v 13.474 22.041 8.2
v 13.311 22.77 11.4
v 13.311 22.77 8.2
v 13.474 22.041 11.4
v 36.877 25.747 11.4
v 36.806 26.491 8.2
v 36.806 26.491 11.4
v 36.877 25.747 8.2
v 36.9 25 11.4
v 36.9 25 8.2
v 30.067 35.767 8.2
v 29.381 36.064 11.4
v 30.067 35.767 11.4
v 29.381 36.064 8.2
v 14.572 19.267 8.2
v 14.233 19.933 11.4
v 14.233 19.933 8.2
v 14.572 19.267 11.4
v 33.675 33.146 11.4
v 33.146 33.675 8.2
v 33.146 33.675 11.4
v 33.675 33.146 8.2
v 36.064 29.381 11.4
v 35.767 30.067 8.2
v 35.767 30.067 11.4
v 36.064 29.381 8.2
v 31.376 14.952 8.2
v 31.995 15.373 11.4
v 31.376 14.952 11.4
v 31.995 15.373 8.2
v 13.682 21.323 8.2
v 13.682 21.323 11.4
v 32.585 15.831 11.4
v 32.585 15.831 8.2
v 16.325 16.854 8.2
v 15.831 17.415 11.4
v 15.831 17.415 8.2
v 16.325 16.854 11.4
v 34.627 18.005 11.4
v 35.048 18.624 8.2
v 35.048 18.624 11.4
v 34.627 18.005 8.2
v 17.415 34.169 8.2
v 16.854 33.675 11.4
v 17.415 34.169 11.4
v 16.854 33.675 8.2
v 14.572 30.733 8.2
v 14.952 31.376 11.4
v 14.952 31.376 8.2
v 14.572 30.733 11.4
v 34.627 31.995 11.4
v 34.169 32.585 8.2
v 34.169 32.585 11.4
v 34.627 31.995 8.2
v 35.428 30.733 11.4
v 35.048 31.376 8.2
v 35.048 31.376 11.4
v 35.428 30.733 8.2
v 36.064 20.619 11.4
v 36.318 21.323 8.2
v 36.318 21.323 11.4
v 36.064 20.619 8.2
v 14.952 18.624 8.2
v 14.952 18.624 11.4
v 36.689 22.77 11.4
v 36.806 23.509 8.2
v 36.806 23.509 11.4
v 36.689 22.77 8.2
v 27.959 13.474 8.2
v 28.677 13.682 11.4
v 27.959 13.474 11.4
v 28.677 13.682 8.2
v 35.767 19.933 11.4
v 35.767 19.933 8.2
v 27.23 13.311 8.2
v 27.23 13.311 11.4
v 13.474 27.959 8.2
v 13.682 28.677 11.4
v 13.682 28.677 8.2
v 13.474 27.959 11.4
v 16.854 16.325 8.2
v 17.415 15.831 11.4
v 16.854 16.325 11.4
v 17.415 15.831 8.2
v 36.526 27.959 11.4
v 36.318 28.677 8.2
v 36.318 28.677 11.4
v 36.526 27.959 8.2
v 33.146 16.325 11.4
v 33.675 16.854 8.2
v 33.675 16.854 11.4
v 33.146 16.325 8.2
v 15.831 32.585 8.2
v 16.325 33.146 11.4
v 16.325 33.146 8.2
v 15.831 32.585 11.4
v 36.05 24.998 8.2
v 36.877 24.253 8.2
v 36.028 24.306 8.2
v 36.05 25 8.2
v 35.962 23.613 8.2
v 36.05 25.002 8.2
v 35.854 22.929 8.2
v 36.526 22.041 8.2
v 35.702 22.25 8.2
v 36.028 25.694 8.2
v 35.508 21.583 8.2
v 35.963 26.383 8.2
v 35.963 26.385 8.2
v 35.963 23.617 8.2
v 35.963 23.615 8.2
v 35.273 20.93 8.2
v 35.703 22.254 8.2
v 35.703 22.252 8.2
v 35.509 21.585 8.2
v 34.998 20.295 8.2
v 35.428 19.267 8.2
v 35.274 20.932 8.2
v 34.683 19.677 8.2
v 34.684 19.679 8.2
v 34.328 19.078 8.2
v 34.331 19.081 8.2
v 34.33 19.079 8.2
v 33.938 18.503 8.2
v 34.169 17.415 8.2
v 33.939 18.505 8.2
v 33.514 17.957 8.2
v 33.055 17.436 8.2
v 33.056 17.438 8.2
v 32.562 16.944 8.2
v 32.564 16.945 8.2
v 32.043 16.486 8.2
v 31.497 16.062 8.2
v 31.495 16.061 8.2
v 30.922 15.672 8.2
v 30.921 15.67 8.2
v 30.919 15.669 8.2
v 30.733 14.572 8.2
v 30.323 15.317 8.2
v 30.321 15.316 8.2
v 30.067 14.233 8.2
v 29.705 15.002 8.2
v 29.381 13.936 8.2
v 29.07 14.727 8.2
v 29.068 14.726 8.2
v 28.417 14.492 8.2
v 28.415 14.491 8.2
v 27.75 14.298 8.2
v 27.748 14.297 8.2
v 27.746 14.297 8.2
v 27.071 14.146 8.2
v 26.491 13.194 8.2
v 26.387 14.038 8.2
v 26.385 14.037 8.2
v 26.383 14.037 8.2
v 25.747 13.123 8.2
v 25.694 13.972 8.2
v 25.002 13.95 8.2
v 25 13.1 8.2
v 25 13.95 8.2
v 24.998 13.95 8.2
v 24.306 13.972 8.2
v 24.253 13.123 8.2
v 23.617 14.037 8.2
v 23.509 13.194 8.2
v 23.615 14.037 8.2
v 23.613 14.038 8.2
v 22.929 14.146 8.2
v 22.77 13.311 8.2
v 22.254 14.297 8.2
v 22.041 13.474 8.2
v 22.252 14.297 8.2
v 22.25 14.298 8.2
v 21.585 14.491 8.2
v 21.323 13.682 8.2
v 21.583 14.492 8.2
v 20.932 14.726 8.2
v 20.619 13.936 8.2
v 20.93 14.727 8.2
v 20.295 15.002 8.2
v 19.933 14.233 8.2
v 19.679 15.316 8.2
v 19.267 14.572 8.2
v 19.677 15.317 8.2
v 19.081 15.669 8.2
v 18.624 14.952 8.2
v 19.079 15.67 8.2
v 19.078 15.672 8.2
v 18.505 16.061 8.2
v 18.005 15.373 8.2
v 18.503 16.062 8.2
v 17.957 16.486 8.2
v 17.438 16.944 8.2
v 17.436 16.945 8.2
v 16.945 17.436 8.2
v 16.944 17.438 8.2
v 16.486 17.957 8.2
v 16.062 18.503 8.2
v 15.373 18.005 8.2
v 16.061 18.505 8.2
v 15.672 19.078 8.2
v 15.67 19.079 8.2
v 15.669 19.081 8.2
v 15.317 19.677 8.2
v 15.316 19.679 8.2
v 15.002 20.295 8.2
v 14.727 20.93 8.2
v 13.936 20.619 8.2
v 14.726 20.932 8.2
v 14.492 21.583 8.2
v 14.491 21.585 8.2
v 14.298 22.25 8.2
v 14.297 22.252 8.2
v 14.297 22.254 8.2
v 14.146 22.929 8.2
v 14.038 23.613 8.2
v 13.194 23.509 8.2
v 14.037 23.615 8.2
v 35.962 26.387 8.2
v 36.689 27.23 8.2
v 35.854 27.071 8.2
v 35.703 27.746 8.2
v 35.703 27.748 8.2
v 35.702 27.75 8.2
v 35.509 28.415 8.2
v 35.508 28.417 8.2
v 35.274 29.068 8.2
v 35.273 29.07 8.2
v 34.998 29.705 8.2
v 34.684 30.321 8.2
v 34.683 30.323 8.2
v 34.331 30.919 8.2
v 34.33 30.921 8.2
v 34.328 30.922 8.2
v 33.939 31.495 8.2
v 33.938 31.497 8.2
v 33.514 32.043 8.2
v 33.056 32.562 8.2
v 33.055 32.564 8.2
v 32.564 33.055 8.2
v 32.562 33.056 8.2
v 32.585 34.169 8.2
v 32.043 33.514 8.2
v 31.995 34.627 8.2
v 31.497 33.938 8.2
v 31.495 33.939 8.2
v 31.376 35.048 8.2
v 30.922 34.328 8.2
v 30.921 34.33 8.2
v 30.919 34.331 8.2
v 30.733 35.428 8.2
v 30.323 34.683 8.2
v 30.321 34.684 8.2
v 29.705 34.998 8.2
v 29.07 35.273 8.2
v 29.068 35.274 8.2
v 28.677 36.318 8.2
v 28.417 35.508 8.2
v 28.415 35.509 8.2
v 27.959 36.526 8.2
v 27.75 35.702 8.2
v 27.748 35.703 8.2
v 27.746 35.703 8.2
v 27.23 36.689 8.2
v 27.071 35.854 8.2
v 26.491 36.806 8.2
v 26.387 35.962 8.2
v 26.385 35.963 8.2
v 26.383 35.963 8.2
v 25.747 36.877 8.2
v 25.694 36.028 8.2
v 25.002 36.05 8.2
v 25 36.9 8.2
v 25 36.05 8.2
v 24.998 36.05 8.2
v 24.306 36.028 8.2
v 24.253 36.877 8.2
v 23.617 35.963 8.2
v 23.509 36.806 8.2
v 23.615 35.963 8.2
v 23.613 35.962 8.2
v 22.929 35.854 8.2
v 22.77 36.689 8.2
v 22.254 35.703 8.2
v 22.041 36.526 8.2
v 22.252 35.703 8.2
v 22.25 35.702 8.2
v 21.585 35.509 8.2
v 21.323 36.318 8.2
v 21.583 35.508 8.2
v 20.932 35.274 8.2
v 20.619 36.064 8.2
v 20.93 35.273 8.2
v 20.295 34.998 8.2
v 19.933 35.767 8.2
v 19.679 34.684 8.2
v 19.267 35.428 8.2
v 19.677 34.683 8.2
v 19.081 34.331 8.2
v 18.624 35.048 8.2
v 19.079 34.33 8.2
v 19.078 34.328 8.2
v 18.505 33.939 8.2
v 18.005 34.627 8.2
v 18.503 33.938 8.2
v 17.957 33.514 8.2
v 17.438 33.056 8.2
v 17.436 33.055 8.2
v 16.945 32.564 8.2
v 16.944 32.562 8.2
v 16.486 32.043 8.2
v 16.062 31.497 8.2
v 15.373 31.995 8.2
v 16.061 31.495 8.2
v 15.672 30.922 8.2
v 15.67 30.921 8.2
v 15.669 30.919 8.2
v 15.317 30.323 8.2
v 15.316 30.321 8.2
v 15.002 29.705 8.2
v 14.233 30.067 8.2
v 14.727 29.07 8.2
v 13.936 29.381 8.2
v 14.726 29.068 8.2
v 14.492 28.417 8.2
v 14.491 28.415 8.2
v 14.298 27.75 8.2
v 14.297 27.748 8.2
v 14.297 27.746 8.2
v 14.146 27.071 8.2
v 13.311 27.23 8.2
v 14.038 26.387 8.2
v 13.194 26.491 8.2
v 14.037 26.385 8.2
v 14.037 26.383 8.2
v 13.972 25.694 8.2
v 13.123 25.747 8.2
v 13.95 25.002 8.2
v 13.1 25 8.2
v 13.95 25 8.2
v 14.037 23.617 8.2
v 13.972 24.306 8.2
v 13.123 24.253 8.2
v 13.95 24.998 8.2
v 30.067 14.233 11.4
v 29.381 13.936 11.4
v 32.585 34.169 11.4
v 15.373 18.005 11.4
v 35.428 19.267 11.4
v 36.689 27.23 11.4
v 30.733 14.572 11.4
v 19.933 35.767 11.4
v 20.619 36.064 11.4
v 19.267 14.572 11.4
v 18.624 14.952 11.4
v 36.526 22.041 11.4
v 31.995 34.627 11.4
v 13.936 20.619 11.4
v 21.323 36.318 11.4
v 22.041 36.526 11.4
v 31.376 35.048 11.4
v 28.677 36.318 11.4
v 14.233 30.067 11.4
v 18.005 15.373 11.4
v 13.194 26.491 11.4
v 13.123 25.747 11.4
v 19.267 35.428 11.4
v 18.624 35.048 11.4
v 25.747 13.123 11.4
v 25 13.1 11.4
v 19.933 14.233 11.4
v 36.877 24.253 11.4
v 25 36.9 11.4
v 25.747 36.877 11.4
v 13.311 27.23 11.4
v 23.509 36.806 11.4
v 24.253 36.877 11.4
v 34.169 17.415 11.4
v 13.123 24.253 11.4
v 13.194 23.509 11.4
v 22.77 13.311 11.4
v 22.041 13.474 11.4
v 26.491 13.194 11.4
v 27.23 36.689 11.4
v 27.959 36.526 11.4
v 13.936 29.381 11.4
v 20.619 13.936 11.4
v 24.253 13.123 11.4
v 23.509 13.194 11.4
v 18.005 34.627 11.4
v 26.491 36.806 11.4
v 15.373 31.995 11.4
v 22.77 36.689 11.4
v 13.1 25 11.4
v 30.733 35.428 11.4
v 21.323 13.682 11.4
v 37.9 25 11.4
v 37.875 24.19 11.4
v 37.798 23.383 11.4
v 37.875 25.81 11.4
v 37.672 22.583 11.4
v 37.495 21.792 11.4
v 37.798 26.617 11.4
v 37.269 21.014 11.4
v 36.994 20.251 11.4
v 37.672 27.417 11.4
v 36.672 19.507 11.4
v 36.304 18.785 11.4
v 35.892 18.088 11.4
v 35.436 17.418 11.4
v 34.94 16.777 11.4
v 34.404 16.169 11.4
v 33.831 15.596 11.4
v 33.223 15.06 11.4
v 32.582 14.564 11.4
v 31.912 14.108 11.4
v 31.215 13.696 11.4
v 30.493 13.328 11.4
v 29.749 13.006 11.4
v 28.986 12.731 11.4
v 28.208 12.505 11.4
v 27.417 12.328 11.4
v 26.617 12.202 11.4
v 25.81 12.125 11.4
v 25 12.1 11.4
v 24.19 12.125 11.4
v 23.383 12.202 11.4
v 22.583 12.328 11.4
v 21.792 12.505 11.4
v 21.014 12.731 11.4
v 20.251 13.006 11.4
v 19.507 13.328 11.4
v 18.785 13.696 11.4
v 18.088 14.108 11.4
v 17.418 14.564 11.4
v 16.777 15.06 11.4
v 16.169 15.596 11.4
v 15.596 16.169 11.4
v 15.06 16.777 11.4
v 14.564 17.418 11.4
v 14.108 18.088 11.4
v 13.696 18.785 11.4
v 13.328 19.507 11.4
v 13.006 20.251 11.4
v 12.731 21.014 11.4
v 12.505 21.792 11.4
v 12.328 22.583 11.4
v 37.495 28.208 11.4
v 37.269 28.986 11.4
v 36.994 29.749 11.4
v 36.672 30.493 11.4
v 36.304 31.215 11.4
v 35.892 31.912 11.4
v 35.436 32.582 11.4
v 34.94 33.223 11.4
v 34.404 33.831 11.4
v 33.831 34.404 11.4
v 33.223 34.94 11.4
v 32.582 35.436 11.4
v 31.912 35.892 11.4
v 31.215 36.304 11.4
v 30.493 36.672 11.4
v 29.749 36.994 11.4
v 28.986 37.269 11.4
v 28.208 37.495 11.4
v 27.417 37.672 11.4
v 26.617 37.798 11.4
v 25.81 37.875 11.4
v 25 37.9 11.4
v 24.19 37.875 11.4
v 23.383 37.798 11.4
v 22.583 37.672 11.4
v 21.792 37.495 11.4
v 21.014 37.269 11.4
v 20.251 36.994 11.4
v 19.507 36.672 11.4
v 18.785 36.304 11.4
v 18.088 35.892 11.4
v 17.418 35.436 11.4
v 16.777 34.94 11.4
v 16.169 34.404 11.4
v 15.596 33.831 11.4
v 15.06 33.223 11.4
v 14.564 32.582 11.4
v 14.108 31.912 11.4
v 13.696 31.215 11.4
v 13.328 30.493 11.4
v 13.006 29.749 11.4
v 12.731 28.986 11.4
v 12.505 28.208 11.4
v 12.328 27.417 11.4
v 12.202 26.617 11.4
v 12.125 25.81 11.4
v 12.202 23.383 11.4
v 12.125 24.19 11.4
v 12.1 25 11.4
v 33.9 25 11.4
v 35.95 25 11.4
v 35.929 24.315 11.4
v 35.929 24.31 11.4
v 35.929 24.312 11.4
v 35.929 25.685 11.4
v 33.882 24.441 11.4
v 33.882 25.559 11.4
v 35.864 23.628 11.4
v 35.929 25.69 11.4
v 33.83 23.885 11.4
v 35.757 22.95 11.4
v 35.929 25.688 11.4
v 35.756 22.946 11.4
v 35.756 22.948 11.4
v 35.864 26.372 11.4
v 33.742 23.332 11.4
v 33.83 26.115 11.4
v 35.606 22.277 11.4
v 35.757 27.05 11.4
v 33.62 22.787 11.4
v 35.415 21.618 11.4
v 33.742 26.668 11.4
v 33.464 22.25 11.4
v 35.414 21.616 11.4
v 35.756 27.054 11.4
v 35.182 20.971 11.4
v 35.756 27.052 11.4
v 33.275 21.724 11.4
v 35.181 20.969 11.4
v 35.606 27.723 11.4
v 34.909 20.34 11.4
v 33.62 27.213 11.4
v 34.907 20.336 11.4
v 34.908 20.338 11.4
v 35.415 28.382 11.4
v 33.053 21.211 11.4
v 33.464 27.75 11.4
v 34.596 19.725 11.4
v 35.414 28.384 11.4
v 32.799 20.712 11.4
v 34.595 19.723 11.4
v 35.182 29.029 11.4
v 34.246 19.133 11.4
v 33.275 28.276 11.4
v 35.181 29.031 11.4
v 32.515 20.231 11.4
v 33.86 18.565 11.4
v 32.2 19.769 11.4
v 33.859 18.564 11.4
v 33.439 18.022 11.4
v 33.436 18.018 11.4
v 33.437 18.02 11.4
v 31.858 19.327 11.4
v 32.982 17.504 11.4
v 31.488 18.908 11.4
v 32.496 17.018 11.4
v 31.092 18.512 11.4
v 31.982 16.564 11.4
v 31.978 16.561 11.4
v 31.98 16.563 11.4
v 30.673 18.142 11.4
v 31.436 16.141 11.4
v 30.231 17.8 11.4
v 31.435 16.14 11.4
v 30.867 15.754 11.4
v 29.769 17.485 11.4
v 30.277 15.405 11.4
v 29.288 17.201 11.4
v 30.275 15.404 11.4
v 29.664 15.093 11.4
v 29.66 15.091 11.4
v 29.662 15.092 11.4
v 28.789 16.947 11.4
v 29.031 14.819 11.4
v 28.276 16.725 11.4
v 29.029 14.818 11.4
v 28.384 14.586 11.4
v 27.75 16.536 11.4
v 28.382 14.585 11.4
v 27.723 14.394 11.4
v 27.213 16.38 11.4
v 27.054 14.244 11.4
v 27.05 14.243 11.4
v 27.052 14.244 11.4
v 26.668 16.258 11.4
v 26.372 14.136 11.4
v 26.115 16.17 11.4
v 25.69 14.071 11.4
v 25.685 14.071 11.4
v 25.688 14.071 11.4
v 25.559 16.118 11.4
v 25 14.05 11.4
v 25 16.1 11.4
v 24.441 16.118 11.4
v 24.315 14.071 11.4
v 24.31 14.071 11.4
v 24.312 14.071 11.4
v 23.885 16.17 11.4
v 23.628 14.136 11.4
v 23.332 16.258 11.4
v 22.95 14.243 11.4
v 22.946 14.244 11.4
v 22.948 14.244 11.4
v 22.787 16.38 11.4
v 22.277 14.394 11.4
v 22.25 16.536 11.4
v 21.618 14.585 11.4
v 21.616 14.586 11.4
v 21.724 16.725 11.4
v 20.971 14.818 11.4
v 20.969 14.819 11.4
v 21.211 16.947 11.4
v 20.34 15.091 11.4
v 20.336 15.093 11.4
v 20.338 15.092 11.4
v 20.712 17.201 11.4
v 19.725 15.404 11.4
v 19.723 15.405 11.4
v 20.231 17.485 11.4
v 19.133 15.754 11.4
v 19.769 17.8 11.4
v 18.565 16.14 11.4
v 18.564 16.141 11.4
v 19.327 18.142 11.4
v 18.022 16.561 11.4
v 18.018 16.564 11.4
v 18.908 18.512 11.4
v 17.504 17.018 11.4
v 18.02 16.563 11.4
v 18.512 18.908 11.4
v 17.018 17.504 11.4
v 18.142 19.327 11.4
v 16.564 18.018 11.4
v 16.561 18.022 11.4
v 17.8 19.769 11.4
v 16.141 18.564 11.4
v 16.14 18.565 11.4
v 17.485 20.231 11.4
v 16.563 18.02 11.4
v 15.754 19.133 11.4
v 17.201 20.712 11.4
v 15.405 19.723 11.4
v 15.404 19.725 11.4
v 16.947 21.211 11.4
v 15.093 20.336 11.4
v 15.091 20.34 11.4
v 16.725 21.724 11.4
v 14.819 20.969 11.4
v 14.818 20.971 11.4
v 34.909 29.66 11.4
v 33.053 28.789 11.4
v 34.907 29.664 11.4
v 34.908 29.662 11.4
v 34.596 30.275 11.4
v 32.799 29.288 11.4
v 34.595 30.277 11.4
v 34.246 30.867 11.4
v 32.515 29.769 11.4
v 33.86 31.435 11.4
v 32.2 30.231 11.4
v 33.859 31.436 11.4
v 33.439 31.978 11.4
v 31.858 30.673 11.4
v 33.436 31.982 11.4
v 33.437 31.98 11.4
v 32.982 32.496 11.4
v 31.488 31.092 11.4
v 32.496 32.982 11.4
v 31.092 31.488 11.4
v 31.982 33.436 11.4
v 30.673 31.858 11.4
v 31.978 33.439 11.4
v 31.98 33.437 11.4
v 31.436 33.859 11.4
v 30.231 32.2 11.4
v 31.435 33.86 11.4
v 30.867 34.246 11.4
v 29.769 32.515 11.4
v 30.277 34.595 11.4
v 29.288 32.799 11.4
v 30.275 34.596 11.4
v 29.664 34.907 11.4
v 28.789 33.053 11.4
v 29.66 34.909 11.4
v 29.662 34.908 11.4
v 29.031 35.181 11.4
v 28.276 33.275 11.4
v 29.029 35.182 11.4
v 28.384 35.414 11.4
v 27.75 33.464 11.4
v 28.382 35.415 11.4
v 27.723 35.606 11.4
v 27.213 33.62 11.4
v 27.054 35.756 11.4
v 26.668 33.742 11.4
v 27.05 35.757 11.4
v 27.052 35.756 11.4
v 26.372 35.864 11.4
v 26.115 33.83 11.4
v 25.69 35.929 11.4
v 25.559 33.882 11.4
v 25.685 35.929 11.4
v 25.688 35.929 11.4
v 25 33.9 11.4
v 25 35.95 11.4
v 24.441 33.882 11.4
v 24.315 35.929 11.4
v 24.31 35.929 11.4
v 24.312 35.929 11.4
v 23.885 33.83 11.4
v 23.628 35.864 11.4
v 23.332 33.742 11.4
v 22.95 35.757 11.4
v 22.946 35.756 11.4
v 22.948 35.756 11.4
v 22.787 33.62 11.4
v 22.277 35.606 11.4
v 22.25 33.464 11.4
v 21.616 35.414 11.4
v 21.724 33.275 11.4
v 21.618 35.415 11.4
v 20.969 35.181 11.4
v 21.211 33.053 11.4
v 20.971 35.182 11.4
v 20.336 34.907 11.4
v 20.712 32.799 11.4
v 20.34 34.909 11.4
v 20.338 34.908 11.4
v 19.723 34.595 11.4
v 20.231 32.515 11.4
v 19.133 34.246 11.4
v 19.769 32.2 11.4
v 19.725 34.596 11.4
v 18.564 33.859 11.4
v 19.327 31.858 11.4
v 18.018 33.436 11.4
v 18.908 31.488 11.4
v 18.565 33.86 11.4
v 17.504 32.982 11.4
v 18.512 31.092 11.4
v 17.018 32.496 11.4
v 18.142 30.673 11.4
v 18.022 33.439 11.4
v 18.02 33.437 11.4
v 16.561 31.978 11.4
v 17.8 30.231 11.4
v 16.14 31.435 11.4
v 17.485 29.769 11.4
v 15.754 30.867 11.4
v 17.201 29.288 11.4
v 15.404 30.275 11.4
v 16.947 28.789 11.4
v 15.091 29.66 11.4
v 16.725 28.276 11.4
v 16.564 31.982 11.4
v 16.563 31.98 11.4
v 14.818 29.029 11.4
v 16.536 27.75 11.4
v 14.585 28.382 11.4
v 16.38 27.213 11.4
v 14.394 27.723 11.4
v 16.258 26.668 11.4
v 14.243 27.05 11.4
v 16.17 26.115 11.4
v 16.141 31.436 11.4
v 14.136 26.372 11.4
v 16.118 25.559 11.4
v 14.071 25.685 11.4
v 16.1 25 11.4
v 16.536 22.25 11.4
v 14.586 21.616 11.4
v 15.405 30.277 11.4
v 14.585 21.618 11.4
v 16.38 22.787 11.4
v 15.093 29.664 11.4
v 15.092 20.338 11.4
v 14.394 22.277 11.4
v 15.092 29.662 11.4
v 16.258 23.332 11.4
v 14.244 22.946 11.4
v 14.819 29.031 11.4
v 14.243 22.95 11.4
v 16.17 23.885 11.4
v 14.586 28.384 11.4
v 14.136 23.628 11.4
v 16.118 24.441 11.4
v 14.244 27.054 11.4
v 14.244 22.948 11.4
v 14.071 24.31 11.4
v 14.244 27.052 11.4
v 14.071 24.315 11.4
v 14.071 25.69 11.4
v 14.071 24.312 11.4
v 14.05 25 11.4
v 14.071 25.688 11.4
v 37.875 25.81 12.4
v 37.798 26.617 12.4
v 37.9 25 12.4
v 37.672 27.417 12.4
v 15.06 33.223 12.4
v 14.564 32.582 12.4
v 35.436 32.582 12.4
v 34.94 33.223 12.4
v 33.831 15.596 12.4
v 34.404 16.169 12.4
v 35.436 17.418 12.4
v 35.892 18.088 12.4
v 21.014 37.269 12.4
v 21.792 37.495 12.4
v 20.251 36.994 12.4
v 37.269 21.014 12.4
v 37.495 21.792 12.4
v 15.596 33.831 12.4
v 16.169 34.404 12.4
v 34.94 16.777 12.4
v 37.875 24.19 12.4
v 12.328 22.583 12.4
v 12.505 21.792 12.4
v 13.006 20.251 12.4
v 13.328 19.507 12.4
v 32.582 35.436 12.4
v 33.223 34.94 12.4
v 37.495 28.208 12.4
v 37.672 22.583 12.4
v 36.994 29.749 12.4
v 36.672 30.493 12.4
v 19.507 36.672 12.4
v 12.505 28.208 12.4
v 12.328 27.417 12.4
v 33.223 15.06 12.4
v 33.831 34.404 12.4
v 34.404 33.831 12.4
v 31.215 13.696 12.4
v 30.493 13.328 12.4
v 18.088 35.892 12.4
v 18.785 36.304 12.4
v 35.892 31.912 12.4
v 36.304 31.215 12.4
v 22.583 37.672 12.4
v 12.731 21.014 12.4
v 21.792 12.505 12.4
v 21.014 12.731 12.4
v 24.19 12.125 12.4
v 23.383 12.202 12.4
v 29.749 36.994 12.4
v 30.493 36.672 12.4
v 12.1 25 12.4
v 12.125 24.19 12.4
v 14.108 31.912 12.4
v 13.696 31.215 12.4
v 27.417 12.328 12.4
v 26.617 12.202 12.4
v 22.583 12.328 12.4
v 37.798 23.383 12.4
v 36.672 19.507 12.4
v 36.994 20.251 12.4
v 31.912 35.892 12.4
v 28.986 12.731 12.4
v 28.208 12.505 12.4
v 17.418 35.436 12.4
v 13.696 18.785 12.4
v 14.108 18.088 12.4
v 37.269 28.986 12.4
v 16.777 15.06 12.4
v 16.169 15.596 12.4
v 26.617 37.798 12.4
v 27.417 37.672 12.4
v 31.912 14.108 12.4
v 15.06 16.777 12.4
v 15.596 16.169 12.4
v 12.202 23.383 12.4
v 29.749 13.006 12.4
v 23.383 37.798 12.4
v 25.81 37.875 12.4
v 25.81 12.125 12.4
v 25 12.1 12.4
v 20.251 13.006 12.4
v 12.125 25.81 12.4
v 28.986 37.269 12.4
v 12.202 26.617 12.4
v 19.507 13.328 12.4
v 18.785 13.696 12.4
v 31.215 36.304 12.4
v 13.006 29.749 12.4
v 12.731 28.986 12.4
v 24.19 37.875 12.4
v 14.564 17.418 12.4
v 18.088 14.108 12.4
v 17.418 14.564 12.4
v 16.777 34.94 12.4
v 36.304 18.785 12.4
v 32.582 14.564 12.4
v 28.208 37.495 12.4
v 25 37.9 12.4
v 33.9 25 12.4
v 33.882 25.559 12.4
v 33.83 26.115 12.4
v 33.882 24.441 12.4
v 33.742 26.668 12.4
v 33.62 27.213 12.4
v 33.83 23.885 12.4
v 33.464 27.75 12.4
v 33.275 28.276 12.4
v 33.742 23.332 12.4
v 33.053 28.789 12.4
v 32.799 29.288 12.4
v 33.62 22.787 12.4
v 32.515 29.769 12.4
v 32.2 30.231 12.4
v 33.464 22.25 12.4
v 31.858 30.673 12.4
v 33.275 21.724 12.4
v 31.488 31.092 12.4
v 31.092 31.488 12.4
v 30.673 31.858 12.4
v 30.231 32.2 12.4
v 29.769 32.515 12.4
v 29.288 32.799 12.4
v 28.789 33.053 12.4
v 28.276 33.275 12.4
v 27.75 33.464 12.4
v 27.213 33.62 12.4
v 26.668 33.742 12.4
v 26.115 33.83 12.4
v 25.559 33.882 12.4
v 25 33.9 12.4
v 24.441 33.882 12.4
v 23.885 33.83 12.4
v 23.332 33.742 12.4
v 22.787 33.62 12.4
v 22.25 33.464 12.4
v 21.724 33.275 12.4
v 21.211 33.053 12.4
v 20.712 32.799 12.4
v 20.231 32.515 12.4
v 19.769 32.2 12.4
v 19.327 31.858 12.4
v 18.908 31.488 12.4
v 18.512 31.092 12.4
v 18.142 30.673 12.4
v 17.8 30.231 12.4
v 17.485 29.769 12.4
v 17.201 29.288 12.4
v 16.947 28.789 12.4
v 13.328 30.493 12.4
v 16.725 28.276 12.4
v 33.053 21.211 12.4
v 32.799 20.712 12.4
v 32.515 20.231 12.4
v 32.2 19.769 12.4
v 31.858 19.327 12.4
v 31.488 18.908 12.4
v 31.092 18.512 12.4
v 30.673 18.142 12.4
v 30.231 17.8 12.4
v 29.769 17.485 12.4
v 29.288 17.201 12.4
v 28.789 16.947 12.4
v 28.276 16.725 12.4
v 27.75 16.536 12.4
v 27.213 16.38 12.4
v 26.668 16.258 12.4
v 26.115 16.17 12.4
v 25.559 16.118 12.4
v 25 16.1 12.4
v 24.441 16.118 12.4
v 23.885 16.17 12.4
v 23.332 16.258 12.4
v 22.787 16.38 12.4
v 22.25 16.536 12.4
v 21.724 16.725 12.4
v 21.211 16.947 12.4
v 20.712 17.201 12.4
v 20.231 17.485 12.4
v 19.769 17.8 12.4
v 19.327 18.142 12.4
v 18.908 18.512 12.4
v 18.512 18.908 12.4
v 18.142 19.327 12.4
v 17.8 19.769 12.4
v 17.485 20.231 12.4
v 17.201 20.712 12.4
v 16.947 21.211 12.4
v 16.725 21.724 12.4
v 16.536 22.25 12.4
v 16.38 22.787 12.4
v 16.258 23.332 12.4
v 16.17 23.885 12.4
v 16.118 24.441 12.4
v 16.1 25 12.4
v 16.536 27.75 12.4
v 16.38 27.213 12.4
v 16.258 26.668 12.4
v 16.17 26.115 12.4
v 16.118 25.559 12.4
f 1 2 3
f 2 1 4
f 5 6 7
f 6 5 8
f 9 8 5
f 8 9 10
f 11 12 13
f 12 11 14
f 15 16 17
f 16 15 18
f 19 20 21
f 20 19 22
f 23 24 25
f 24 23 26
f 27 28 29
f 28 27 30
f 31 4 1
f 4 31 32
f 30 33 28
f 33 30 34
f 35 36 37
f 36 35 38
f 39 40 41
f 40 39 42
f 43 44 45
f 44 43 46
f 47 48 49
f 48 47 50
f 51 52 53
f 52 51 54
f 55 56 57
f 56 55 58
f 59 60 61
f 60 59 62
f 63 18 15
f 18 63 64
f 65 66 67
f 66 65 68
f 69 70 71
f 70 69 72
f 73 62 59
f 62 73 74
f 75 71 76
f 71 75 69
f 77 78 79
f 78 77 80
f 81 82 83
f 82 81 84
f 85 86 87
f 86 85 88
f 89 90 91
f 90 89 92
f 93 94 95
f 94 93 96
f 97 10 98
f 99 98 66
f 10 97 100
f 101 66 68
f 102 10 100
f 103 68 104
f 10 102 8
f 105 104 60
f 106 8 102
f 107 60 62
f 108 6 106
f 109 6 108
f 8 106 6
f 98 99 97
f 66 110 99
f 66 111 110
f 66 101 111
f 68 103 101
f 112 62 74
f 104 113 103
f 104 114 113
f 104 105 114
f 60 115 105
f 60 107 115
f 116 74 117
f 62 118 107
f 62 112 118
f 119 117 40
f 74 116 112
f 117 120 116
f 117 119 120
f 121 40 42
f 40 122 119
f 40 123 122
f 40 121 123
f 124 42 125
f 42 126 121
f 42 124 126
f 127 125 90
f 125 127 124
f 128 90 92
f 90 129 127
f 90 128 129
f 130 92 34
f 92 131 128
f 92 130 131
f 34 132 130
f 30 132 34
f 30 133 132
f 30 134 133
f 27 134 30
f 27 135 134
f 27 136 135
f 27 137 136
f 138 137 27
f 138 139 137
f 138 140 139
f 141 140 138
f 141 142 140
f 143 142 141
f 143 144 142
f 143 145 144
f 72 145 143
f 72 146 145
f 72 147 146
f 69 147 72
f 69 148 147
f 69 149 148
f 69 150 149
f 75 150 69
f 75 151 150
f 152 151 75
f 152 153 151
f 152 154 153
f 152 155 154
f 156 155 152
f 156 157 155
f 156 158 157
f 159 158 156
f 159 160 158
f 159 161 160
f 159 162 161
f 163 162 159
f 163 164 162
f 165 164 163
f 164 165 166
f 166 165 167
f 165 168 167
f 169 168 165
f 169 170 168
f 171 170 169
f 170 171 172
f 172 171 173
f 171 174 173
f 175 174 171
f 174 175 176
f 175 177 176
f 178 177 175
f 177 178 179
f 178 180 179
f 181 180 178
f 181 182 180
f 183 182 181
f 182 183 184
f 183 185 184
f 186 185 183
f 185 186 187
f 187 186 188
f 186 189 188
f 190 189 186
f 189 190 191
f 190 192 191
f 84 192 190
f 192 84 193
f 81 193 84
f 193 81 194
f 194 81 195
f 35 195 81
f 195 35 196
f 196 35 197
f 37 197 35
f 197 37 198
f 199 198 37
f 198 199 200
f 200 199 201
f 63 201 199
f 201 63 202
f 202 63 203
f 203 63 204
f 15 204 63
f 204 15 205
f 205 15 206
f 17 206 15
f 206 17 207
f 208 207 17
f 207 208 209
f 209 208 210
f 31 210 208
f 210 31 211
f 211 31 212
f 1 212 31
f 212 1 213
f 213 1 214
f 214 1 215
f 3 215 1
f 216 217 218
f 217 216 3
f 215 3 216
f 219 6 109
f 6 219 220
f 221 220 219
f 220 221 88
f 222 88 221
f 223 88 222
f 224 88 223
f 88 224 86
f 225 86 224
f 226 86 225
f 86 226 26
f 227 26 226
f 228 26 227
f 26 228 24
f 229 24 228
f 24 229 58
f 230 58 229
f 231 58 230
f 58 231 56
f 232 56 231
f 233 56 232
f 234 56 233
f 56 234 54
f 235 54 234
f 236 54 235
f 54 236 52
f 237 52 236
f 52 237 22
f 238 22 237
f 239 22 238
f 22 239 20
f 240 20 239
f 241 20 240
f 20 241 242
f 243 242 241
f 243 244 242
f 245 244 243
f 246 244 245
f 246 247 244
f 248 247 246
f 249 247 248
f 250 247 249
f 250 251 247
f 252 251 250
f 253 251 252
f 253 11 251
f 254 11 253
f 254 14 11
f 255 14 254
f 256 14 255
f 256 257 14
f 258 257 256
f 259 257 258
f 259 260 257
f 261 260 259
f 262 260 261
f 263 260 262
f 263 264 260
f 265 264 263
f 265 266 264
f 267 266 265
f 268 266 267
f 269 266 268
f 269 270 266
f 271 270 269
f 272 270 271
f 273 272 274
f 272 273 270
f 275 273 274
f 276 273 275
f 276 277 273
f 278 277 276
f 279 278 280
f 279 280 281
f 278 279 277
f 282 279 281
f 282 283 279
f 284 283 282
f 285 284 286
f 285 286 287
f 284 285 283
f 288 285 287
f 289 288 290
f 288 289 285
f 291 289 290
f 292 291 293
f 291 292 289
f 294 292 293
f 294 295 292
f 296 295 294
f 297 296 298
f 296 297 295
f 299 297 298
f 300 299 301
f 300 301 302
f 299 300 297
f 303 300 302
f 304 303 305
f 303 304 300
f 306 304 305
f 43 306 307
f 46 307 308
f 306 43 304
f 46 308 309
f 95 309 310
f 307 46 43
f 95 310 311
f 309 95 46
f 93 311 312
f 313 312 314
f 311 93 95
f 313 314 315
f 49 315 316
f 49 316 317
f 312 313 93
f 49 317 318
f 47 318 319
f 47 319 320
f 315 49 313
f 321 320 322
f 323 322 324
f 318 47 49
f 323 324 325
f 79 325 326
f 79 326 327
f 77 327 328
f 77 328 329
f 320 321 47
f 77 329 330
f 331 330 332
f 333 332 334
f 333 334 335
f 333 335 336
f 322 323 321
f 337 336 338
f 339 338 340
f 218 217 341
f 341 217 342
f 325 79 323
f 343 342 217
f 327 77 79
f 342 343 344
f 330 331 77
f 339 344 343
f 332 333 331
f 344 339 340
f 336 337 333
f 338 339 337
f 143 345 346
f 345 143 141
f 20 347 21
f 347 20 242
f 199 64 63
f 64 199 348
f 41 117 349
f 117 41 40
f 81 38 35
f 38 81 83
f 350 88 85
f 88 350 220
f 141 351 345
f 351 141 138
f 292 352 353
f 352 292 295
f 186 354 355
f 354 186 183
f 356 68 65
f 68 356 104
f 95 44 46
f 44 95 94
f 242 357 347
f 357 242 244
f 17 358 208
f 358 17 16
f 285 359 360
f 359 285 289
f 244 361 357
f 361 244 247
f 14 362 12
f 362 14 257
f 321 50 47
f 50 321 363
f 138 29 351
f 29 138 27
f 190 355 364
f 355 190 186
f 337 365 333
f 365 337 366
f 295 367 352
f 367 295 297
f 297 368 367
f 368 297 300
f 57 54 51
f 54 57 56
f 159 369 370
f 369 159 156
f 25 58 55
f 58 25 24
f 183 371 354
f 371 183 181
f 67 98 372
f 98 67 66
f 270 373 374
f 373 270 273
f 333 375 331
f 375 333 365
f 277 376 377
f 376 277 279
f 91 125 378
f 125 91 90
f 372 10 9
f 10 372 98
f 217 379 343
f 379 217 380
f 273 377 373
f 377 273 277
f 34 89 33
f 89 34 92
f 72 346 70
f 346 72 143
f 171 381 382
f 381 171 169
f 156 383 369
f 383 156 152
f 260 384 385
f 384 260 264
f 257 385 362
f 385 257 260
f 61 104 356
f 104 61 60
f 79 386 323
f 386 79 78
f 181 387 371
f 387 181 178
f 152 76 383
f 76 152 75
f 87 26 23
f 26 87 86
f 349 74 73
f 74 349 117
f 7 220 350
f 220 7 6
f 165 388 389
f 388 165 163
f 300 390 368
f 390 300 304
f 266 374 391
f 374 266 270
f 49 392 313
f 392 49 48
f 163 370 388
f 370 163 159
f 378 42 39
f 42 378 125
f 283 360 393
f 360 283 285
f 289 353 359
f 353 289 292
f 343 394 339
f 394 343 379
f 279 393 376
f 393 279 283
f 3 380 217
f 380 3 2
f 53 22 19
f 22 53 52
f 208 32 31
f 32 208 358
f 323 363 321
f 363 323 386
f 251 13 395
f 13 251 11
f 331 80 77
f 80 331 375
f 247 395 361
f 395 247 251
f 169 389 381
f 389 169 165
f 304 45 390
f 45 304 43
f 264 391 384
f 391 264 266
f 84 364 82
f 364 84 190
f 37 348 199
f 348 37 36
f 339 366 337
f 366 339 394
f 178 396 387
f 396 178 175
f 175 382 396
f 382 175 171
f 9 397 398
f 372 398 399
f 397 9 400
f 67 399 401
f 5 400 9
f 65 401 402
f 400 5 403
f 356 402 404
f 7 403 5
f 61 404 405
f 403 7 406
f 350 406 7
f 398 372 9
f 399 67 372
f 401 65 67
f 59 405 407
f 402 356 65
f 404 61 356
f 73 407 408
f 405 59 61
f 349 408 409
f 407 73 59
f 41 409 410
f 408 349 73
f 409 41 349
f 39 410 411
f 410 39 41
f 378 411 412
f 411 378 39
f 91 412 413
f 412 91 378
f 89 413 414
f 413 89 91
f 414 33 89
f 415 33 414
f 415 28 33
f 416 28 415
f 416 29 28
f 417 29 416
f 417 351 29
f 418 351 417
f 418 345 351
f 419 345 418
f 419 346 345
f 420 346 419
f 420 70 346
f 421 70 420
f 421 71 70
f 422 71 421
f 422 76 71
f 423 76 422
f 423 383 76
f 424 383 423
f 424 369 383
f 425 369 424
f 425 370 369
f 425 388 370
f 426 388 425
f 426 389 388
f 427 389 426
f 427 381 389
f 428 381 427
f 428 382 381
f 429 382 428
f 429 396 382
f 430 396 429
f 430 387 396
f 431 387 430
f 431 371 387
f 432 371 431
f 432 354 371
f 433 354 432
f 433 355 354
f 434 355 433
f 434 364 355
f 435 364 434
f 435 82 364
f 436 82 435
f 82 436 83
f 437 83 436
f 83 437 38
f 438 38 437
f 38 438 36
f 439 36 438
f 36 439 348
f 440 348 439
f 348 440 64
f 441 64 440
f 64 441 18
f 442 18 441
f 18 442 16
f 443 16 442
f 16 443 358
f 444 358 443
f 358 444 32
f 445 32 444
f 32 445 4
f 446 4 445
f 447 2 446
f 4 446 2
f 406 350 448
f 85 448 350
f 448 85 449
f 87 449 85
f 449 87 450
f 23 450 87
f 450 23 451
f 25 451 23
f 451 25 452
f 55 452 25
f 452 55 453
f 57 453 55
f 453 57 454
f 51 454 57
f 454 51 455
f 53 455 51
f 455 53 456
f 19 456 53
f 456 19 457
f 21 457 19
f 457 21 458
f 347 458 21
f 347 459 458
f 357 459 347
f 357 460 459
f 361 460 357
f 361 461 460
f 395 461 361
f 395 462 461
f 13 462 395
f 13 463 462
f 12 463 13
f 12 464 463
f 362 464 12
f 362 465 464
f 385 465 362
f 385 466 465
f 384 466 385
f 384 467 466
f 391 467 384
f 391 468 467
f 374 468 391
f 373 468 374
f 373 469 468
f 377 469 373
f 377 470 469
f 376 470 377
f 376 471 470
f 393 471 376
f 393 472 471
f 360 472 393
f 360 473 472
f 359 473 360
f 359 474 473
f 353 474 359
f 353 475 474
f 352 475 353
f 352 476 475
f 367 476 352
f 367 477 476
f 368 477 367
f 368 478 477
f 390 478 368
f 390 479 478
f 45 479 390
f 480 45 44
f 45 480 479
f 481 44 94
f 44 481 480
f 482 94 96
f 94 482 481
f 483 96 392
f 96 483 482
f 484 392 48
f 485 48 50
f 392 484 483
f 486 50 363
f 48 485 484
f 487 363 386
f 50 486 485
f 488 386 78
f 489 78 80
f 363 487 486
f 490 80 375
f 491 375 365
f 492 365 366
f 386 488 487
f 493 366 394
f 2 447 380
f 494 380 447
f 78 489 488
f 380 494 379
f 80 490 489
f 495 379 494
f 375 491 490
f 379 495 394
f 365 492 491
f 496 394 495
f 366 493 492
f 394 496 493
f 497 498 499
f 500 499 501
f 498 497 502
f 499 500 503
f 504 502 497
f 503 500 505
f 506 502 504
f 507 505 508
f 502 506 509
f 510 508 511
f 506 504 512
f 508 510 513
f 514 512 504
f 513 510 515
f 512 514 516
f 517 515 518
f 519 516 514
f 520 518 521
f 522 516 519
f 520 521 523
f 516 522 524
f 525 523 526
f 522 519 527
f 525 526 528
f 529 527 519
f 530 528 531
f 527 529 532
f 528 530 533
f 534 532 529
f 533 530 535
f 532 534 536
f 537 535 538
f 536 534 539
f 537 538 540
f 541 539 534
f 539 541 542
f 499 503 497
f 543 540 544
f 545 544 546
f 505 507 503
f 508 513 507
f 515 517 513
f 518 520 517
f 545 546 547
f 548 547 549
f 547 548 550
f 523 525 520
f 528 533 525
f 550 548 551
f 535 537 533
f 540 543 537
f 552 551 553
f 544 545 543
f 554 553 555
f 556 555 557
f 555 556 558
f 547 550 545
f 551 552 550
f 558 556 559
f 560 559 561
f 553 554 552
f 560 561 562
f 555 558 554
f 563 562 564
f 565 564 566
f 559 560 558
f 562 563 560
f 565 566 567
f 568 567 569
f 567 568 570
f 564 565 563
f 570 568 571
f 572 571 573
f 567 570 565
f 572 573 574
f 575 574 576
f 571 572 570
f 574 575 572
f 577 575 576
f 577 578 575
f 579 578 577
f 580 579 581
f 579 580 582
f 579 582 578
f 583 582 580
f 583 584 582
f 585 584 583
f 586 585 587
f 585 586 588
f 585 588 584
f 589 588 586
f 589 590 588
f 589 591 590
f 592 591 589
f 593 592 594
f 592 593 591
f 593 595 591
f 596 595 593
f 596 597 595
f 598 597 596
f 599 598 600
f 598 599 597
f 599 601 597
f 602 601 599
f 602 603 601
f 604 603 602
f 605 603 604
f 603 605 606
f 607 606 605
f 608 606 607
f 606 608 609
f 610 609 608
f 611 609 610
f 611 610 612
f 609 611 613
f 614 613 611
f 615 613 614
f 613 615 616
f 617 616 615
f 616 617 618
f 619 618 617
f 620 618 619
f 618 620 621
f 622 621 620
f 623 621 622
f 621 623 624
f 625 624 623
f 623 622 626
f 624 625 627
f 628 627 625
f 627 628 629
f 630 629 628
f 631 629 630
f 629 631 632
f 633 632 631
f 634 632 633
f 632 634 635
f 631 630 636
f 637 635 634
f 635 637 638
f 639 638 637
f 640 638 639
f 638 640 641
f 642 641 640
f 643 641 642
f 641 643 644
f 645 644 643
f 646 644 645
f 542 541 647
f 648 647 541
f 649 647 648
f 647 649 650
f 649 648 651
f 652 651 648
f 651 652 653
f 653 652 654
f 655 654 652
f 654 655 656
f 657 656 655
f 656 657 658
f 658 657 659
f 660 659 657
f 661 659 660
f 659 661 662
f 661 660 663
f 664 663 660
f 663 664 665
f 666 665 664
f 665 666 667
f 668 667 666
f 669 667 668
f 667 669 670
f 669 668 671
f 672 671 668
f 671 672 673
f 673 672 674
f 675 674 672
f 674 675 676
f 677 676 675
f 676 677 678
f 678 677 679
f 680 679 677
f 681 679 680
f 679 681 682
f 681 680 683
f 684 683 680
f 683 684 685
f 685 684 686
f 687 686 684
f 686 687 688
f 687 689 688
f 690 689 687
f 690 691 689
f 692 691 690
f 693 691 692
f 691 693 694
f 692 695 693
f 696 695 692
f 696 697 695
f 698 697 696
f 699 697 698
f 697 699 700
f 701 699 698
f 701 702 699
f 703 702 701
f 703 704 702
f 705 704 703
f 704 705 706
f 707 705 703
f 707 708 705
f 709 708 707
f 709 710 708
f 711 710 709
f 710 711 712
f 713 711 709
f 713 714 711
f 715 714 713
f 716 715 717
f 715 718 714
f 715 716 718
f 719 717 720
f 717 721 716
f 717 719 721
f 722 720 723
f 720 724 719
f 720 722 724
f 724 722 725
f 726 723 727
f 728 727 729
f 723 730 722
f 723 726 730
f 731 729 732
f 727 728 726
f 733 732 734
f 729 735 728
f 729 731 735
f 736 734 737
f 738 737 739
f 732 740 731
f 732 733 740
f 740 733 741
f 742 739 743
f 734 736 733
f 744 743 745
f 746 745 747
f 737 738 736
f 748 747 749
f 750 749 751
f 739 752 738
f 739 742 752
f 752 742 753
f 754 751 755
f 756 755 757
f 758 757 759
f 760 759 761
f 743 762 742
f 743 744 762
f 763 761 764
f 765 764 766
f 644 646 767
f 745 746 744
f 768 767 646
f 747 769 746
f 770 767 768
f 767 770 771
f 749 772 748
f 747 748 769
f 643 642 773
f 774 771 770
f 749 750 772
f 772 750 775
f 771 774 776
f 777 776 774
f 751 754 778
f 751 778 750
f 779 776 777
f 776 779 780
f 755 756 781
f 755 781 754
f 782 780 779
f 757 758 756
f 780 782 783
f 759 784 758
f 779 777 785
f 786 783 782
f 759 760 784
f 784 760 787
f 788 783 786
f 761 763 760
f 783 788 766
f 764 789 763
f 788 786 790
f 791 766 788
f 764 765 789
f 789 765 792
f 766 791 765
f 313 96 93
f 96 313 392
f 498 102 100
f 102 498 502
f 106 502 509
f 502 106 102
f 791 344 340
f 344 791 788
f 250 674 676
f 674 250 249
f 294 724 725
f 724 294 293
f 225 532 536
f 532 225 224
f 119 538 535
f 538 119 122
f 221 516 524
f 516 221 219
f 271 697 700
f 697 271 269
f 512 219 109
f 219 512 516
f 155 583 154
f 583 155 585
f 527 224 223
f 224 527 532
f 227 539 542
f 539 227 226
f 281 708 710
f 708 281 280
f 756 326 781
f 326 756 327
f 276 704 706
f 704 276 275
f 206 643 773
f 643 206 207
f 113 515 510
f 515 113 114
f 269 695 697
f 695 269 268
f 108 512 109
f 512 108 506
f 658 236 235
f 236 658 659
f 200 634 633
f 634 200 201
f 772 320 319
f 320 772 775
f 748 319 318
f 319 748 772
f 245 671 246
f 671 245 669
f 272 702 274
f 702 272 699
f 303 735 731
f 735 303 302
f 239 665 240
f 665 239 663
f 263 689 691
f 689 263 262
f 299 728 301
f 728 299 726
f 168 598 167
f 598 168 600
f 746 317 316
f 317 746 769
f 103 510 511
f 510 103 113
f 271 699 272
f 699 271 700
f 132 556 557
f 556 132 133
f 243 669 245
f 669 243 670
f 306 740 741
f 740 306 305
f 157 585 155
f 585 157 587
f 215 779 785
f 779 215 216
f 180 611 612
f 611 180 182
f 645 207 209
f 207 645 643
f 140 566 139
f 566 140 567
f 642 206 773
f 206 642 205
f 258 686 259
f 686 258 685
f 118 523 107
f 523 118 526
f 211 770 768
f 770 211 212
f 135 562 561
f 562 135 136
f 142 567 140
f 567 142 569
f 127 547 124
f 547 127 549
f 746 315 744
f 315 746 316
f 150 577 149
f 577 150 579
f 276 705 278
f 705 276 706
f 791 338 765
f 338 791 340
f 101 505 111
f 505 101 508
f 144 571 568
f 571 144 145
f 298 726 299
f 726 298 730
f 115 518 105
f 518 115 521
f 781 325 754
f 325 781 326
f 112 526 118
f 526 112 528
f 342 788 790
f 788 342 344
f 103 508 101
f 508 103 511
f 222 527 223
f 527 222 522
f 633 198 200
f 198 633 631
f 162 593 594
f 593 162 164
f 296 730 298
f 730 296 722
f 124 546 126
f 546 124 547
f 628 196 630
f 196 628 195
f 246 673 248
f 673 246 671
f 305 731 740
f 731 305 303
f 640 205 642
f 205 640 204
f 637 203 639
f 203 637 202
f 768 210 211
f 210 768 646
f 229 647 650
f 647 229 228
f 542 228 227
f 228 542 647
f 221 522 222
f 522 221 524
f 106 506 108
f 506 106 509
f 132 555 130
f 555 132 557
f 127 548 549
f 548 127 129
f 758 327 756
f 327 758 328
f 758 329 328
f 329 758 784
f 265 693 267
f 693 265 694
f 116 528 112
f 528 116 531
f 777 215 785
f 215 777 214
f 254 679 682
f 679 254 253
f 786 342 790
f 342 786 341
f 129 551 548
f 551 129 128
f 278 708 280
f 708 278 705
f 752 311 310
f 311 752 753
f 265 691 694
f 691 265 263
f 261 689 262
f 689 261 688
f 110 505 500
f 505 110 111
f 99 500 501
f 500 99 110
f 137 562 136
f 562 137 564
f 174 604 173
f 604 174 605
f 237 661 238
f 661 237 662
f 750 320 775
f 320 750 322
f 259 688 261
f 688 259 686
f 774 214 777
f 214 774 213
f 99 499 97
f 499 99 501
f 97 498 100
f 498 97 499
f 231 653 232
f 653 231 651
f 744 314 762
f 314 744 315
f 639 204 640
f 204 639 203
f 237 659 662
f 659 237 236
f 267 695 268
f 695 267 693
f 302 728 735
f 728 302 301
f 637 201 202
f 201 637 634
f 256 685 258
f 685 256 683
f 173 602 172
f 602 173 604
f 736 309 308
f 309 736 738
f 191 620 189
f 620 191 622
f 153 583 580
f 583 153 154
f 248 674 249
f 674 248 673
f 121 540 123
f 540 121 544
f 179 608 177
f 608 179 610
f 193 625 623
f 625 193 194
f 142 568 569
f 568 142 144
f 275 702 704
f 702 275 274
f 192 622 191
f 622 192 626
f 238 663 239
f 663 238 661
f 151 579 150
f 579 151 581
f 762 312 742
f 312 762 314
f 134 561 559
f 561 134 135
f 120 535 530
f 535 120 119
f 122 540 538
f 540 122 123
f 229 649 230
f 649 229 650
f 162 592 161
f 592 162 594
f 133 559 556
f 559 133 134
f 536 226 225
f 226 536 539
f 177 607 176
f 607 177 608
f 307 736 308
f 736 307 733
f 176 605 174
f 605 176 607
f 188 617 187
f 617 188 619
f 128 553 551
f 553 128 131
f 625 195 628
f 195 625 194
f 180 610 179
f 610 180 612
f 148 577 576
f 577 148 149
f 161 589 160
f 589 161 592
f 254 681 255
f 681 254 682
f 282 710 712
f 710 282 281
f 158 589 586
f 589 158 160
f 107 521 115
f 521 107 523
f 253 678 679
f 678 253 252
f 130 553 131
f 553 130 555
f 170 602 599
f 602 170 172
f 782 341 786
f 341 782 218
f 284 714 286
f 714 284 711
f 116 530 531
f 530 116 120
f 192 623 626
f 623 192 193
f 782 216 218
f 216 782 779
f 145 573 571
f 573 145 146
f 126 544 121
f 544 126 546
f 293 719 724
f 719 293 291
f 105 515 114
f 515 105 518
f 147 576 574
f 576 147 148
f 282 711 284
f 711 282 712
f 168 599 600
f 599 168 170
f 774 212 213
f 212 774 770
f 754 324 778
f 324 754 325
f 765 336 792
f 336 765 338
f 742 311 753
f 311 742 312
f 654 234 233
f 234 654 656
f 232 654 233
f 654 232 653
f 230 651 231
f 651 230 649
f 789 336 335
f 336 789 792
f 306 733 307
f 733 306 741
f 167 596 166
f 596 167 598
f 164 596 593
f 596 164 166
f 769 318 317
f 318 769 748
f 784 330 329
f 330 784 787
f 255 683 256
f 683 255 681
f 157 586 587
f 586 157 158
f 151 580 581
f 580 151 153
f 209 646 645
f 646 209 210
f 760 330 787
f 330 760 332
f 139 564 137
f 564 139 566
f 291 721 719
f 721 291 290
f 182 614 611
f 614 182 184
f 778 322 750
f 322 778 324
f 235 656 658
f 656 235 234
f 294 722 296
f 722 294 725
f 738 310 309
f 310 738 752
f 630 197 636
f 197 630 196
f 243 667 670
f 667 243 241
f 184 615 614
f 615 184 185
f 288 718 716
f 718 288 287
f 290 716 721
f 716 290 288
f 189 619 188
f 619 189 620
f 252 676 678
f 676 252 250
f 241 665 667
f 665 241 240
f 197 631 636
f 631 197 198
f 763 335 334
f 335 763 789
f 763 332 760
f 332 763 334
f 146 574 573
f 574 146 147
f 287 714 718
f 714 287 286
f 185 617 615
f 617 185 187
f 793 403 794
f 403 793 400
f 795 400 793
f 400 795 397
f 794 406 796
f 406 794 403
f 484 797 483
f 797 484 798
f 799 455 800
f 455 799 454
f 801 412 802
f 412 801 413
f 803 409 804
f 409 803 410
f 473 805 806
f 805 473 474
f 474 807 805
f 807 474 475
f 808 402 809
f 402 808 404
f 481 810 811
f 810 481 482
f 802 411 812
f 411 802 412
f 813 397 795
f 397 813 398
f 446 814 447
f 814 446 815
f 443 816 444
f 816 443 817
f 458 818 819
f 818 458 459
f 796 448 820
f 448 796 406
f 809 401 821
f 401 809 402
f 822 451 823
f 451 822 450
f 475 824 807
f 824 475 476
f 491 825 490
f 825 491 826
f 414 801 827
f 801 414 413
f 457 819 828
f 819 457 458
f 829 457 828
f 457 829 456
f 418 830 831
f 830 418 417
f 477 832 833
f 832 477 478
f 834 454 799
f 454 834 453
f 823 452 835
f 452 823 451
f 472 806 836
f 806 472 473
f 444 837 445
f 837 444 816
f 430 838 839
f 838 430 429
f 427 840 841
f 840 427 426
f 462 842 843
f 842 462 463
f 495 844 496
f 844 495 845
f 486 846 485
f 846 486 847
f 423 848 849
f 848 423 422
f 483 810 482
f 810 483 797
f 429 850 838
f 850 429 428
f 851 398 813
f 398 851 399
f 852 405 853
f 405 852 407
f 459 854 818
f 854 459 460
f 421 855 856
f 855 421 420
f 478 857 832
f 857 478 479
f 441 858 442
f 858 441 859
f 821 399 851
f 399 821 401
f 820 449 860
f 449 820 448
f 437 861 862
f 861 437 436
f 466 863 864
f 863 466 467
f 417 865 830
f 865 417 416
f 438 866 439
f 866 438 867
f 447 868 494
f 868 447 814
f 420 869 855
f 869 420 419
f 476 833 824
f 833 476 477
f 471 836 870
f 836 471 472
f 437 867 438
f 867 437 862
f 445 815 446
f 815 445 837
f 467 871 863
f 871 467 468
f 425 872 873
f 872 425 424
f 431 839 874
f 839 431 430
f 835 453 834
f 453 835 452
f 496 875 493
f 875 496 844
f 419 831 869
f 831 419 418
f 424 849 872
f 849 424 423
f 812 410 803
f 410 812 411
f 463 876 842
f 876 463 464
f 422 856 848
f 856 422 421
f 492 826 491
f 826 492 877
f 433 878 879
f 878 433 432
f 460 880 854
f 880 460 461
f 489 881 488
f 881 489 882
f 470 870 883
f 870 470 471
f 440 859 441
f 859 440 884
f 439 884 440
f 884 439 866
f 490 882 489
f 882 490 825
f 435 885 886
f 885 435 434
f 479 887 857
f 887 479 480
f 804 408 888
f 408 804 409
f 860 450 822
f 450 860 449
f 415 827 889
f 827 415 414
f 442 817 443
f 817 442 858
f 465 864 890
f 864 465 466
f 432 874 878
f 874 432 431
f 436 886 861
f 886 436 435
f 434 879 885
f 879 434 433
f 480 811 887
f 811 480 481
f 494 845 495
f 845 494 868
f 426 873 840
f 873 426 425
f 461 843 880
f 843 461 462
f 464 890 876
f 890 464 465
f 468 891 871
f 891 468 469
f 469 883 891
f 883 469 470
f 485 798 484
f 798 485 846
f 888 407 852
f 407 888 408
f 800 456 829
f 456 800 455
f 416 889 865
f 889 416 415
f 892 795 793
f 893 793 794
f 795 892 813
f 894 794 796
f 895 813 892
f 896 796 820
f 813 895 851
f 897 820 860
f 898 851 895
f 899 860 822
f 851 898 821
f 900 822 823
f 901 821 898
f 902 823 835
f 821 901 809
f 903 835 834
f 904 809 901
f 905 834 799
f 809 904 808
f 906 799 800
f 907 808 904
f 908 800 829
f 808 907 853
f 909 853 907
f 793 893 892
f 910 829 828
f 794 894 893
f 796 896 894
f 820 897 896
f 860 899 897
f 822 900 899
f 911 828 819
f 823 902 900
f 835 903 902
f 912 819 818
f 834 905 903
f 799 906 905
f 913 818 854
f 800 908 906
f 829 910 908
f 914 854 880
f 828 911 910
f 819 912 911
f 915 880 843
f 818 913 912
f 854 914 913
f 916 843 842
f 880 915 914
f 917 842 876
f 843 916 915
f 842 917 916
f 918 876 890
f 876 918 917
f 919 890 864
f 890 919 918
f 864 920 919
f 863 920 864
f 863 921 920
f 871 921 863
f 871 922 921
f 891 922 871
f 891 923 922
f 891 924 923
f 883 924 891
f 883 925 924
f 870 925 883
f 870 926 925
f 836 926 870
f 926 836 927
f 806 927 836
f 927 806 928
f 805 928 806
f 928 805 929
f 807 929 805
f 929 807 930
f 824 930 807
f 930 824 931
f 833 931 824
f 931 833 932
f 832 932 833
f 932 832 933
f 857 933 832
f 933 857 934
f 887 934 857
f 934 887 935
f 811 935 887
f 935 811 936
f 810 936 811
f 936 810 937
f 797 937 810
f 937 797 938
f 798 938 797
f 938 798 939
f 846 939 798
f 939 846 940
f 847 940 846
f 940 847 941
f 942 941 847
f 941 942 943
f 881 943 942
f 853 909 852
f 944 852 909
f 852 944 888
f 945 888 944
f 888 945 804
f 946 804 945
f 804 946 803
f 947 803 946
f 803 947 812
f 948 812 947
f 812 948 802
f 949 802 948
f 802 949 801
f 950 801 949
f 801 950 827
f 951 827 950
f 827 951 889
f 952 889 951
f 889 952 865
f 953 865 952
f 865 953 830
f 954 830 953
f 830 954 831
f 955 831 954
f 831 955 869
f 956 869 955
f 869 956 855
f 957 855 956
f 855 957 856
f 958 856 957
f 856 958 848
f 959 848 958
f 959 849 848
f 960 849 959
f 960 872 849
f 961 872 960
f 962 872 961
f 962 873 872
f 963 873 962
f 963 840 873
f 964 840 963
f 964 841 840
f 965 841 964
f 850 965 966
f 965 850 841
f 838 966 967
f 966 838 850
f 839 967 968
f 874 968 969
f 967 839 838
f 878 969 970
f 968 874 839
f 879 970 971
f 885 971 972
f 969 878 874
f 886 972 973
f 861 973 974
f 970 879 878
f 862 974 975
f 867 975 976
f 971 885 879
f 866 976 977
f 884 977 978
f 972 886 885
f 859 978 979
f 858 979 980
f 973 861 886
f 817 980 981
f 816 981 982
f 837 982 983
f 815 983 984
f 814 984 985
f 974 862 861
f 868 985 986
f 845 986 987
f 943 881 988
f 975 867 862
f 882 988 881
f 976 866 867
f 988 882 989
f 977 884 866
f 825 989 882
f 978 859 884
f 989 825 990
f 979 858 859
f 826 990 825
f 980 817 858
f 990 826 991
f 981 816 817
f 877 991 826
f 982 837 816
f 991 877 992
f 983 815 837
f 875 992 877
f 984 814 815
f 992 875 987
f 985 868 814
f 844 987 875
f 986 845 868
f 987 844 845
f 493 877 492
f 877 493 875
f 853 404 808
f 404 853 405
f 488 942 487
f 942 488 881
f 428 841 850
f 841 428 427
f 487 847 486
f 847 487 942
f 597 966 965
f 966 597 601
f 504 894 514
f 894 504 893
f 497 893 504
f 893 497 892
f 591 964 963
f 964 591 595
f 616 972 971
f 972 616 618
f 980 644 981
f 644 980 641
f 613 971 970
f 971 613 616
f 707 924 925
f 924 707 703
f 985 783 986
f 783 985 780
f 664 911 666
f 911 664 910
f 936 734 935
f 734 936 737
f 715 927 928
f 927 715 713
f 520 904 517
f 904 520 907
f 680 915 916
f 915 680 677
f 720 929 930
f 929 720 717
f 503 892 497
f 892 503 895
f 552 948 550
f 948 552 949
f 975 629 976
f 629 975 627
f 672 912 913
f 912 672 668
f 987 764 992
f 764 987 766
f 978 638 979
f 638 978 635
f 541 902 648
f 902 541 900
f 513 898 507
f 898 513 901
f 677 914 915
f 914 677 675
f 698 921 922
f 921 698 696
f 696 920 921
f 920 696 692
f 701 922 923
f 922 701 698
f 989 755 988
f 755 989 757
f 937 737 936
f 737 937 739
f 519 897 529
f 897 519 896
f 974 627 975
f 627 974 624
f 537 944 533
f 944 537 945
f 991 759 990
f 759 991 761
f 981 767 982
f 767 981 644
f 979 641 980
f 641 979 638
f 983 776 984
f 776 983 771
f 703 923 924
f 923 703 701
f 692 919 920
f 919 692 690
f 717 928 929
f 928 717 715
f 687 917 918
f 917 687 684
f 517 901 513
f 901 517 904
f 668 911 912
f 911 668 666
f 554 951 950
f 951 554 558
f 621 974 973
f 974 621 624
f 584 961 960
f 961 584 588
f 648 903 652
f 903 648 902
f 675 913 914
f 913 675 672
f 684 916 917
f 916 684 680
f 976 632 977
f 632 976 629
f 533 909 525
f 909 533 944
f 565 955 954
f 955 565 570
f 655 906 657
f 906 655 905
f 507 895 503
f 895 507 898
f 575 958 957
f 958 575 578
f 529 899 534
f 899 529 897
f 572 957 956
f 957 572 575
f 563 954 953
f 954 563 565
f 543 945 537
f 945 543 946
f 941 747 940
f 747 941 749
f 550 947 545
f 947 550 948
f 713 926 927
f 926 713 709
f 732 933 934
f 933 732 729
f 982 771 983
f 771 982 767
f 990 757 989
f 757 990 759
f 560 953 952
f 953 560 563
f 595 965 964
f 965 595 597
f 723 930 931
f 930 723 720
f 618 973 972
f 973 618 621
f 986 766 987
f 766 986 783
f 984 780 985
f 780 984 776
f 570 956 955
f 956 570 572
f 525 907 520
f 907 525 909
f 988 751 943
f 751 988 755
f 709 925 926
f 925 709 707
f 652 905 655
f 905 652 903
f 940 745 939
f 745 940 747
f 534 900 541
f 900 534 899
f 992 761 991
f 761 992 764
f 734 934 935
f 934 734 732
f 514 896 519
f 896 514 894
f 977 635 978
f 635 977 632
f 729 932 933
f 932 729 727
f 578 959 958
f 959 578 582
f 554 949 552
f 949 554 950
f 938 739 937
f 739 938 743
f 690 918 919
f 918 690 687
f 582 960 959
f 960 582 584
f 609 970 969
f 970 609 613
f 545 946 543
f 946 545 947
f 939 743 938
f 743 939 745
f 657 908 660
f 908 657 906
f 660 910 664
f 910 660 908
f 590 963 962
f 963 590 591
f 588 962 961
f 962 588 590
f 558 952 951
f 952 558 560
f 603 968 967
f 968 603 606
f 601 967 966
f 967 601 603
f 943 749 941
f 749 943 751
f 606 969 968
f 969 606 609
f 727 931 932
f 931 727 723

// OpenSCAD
$fn=100;
L=50; //Länge
R=18.8*0.5; // Radius Linse
HL = 3.2; // Höhe Linse
E=0.01;
H=3; //Höhe Platte
    
    
difference(){
    translate([0.5*L,0.5*L,HL+5])cylinder(h=HL,r=R+2.5);
    translate([0.5*L,0.5*L,HL+5-E])cylinder(h=HL+2*E,r1=R+1.65,r2=R+1.55);
    }
difference(){
    translate([0.5*L,0.5*L,2*HL+5])cylinder(h=1,r=R+3.5);
    translate([0.5*L,0.5*L,2*HL+5-E])cylinder(h=2,r=R-0.5);
    }    
